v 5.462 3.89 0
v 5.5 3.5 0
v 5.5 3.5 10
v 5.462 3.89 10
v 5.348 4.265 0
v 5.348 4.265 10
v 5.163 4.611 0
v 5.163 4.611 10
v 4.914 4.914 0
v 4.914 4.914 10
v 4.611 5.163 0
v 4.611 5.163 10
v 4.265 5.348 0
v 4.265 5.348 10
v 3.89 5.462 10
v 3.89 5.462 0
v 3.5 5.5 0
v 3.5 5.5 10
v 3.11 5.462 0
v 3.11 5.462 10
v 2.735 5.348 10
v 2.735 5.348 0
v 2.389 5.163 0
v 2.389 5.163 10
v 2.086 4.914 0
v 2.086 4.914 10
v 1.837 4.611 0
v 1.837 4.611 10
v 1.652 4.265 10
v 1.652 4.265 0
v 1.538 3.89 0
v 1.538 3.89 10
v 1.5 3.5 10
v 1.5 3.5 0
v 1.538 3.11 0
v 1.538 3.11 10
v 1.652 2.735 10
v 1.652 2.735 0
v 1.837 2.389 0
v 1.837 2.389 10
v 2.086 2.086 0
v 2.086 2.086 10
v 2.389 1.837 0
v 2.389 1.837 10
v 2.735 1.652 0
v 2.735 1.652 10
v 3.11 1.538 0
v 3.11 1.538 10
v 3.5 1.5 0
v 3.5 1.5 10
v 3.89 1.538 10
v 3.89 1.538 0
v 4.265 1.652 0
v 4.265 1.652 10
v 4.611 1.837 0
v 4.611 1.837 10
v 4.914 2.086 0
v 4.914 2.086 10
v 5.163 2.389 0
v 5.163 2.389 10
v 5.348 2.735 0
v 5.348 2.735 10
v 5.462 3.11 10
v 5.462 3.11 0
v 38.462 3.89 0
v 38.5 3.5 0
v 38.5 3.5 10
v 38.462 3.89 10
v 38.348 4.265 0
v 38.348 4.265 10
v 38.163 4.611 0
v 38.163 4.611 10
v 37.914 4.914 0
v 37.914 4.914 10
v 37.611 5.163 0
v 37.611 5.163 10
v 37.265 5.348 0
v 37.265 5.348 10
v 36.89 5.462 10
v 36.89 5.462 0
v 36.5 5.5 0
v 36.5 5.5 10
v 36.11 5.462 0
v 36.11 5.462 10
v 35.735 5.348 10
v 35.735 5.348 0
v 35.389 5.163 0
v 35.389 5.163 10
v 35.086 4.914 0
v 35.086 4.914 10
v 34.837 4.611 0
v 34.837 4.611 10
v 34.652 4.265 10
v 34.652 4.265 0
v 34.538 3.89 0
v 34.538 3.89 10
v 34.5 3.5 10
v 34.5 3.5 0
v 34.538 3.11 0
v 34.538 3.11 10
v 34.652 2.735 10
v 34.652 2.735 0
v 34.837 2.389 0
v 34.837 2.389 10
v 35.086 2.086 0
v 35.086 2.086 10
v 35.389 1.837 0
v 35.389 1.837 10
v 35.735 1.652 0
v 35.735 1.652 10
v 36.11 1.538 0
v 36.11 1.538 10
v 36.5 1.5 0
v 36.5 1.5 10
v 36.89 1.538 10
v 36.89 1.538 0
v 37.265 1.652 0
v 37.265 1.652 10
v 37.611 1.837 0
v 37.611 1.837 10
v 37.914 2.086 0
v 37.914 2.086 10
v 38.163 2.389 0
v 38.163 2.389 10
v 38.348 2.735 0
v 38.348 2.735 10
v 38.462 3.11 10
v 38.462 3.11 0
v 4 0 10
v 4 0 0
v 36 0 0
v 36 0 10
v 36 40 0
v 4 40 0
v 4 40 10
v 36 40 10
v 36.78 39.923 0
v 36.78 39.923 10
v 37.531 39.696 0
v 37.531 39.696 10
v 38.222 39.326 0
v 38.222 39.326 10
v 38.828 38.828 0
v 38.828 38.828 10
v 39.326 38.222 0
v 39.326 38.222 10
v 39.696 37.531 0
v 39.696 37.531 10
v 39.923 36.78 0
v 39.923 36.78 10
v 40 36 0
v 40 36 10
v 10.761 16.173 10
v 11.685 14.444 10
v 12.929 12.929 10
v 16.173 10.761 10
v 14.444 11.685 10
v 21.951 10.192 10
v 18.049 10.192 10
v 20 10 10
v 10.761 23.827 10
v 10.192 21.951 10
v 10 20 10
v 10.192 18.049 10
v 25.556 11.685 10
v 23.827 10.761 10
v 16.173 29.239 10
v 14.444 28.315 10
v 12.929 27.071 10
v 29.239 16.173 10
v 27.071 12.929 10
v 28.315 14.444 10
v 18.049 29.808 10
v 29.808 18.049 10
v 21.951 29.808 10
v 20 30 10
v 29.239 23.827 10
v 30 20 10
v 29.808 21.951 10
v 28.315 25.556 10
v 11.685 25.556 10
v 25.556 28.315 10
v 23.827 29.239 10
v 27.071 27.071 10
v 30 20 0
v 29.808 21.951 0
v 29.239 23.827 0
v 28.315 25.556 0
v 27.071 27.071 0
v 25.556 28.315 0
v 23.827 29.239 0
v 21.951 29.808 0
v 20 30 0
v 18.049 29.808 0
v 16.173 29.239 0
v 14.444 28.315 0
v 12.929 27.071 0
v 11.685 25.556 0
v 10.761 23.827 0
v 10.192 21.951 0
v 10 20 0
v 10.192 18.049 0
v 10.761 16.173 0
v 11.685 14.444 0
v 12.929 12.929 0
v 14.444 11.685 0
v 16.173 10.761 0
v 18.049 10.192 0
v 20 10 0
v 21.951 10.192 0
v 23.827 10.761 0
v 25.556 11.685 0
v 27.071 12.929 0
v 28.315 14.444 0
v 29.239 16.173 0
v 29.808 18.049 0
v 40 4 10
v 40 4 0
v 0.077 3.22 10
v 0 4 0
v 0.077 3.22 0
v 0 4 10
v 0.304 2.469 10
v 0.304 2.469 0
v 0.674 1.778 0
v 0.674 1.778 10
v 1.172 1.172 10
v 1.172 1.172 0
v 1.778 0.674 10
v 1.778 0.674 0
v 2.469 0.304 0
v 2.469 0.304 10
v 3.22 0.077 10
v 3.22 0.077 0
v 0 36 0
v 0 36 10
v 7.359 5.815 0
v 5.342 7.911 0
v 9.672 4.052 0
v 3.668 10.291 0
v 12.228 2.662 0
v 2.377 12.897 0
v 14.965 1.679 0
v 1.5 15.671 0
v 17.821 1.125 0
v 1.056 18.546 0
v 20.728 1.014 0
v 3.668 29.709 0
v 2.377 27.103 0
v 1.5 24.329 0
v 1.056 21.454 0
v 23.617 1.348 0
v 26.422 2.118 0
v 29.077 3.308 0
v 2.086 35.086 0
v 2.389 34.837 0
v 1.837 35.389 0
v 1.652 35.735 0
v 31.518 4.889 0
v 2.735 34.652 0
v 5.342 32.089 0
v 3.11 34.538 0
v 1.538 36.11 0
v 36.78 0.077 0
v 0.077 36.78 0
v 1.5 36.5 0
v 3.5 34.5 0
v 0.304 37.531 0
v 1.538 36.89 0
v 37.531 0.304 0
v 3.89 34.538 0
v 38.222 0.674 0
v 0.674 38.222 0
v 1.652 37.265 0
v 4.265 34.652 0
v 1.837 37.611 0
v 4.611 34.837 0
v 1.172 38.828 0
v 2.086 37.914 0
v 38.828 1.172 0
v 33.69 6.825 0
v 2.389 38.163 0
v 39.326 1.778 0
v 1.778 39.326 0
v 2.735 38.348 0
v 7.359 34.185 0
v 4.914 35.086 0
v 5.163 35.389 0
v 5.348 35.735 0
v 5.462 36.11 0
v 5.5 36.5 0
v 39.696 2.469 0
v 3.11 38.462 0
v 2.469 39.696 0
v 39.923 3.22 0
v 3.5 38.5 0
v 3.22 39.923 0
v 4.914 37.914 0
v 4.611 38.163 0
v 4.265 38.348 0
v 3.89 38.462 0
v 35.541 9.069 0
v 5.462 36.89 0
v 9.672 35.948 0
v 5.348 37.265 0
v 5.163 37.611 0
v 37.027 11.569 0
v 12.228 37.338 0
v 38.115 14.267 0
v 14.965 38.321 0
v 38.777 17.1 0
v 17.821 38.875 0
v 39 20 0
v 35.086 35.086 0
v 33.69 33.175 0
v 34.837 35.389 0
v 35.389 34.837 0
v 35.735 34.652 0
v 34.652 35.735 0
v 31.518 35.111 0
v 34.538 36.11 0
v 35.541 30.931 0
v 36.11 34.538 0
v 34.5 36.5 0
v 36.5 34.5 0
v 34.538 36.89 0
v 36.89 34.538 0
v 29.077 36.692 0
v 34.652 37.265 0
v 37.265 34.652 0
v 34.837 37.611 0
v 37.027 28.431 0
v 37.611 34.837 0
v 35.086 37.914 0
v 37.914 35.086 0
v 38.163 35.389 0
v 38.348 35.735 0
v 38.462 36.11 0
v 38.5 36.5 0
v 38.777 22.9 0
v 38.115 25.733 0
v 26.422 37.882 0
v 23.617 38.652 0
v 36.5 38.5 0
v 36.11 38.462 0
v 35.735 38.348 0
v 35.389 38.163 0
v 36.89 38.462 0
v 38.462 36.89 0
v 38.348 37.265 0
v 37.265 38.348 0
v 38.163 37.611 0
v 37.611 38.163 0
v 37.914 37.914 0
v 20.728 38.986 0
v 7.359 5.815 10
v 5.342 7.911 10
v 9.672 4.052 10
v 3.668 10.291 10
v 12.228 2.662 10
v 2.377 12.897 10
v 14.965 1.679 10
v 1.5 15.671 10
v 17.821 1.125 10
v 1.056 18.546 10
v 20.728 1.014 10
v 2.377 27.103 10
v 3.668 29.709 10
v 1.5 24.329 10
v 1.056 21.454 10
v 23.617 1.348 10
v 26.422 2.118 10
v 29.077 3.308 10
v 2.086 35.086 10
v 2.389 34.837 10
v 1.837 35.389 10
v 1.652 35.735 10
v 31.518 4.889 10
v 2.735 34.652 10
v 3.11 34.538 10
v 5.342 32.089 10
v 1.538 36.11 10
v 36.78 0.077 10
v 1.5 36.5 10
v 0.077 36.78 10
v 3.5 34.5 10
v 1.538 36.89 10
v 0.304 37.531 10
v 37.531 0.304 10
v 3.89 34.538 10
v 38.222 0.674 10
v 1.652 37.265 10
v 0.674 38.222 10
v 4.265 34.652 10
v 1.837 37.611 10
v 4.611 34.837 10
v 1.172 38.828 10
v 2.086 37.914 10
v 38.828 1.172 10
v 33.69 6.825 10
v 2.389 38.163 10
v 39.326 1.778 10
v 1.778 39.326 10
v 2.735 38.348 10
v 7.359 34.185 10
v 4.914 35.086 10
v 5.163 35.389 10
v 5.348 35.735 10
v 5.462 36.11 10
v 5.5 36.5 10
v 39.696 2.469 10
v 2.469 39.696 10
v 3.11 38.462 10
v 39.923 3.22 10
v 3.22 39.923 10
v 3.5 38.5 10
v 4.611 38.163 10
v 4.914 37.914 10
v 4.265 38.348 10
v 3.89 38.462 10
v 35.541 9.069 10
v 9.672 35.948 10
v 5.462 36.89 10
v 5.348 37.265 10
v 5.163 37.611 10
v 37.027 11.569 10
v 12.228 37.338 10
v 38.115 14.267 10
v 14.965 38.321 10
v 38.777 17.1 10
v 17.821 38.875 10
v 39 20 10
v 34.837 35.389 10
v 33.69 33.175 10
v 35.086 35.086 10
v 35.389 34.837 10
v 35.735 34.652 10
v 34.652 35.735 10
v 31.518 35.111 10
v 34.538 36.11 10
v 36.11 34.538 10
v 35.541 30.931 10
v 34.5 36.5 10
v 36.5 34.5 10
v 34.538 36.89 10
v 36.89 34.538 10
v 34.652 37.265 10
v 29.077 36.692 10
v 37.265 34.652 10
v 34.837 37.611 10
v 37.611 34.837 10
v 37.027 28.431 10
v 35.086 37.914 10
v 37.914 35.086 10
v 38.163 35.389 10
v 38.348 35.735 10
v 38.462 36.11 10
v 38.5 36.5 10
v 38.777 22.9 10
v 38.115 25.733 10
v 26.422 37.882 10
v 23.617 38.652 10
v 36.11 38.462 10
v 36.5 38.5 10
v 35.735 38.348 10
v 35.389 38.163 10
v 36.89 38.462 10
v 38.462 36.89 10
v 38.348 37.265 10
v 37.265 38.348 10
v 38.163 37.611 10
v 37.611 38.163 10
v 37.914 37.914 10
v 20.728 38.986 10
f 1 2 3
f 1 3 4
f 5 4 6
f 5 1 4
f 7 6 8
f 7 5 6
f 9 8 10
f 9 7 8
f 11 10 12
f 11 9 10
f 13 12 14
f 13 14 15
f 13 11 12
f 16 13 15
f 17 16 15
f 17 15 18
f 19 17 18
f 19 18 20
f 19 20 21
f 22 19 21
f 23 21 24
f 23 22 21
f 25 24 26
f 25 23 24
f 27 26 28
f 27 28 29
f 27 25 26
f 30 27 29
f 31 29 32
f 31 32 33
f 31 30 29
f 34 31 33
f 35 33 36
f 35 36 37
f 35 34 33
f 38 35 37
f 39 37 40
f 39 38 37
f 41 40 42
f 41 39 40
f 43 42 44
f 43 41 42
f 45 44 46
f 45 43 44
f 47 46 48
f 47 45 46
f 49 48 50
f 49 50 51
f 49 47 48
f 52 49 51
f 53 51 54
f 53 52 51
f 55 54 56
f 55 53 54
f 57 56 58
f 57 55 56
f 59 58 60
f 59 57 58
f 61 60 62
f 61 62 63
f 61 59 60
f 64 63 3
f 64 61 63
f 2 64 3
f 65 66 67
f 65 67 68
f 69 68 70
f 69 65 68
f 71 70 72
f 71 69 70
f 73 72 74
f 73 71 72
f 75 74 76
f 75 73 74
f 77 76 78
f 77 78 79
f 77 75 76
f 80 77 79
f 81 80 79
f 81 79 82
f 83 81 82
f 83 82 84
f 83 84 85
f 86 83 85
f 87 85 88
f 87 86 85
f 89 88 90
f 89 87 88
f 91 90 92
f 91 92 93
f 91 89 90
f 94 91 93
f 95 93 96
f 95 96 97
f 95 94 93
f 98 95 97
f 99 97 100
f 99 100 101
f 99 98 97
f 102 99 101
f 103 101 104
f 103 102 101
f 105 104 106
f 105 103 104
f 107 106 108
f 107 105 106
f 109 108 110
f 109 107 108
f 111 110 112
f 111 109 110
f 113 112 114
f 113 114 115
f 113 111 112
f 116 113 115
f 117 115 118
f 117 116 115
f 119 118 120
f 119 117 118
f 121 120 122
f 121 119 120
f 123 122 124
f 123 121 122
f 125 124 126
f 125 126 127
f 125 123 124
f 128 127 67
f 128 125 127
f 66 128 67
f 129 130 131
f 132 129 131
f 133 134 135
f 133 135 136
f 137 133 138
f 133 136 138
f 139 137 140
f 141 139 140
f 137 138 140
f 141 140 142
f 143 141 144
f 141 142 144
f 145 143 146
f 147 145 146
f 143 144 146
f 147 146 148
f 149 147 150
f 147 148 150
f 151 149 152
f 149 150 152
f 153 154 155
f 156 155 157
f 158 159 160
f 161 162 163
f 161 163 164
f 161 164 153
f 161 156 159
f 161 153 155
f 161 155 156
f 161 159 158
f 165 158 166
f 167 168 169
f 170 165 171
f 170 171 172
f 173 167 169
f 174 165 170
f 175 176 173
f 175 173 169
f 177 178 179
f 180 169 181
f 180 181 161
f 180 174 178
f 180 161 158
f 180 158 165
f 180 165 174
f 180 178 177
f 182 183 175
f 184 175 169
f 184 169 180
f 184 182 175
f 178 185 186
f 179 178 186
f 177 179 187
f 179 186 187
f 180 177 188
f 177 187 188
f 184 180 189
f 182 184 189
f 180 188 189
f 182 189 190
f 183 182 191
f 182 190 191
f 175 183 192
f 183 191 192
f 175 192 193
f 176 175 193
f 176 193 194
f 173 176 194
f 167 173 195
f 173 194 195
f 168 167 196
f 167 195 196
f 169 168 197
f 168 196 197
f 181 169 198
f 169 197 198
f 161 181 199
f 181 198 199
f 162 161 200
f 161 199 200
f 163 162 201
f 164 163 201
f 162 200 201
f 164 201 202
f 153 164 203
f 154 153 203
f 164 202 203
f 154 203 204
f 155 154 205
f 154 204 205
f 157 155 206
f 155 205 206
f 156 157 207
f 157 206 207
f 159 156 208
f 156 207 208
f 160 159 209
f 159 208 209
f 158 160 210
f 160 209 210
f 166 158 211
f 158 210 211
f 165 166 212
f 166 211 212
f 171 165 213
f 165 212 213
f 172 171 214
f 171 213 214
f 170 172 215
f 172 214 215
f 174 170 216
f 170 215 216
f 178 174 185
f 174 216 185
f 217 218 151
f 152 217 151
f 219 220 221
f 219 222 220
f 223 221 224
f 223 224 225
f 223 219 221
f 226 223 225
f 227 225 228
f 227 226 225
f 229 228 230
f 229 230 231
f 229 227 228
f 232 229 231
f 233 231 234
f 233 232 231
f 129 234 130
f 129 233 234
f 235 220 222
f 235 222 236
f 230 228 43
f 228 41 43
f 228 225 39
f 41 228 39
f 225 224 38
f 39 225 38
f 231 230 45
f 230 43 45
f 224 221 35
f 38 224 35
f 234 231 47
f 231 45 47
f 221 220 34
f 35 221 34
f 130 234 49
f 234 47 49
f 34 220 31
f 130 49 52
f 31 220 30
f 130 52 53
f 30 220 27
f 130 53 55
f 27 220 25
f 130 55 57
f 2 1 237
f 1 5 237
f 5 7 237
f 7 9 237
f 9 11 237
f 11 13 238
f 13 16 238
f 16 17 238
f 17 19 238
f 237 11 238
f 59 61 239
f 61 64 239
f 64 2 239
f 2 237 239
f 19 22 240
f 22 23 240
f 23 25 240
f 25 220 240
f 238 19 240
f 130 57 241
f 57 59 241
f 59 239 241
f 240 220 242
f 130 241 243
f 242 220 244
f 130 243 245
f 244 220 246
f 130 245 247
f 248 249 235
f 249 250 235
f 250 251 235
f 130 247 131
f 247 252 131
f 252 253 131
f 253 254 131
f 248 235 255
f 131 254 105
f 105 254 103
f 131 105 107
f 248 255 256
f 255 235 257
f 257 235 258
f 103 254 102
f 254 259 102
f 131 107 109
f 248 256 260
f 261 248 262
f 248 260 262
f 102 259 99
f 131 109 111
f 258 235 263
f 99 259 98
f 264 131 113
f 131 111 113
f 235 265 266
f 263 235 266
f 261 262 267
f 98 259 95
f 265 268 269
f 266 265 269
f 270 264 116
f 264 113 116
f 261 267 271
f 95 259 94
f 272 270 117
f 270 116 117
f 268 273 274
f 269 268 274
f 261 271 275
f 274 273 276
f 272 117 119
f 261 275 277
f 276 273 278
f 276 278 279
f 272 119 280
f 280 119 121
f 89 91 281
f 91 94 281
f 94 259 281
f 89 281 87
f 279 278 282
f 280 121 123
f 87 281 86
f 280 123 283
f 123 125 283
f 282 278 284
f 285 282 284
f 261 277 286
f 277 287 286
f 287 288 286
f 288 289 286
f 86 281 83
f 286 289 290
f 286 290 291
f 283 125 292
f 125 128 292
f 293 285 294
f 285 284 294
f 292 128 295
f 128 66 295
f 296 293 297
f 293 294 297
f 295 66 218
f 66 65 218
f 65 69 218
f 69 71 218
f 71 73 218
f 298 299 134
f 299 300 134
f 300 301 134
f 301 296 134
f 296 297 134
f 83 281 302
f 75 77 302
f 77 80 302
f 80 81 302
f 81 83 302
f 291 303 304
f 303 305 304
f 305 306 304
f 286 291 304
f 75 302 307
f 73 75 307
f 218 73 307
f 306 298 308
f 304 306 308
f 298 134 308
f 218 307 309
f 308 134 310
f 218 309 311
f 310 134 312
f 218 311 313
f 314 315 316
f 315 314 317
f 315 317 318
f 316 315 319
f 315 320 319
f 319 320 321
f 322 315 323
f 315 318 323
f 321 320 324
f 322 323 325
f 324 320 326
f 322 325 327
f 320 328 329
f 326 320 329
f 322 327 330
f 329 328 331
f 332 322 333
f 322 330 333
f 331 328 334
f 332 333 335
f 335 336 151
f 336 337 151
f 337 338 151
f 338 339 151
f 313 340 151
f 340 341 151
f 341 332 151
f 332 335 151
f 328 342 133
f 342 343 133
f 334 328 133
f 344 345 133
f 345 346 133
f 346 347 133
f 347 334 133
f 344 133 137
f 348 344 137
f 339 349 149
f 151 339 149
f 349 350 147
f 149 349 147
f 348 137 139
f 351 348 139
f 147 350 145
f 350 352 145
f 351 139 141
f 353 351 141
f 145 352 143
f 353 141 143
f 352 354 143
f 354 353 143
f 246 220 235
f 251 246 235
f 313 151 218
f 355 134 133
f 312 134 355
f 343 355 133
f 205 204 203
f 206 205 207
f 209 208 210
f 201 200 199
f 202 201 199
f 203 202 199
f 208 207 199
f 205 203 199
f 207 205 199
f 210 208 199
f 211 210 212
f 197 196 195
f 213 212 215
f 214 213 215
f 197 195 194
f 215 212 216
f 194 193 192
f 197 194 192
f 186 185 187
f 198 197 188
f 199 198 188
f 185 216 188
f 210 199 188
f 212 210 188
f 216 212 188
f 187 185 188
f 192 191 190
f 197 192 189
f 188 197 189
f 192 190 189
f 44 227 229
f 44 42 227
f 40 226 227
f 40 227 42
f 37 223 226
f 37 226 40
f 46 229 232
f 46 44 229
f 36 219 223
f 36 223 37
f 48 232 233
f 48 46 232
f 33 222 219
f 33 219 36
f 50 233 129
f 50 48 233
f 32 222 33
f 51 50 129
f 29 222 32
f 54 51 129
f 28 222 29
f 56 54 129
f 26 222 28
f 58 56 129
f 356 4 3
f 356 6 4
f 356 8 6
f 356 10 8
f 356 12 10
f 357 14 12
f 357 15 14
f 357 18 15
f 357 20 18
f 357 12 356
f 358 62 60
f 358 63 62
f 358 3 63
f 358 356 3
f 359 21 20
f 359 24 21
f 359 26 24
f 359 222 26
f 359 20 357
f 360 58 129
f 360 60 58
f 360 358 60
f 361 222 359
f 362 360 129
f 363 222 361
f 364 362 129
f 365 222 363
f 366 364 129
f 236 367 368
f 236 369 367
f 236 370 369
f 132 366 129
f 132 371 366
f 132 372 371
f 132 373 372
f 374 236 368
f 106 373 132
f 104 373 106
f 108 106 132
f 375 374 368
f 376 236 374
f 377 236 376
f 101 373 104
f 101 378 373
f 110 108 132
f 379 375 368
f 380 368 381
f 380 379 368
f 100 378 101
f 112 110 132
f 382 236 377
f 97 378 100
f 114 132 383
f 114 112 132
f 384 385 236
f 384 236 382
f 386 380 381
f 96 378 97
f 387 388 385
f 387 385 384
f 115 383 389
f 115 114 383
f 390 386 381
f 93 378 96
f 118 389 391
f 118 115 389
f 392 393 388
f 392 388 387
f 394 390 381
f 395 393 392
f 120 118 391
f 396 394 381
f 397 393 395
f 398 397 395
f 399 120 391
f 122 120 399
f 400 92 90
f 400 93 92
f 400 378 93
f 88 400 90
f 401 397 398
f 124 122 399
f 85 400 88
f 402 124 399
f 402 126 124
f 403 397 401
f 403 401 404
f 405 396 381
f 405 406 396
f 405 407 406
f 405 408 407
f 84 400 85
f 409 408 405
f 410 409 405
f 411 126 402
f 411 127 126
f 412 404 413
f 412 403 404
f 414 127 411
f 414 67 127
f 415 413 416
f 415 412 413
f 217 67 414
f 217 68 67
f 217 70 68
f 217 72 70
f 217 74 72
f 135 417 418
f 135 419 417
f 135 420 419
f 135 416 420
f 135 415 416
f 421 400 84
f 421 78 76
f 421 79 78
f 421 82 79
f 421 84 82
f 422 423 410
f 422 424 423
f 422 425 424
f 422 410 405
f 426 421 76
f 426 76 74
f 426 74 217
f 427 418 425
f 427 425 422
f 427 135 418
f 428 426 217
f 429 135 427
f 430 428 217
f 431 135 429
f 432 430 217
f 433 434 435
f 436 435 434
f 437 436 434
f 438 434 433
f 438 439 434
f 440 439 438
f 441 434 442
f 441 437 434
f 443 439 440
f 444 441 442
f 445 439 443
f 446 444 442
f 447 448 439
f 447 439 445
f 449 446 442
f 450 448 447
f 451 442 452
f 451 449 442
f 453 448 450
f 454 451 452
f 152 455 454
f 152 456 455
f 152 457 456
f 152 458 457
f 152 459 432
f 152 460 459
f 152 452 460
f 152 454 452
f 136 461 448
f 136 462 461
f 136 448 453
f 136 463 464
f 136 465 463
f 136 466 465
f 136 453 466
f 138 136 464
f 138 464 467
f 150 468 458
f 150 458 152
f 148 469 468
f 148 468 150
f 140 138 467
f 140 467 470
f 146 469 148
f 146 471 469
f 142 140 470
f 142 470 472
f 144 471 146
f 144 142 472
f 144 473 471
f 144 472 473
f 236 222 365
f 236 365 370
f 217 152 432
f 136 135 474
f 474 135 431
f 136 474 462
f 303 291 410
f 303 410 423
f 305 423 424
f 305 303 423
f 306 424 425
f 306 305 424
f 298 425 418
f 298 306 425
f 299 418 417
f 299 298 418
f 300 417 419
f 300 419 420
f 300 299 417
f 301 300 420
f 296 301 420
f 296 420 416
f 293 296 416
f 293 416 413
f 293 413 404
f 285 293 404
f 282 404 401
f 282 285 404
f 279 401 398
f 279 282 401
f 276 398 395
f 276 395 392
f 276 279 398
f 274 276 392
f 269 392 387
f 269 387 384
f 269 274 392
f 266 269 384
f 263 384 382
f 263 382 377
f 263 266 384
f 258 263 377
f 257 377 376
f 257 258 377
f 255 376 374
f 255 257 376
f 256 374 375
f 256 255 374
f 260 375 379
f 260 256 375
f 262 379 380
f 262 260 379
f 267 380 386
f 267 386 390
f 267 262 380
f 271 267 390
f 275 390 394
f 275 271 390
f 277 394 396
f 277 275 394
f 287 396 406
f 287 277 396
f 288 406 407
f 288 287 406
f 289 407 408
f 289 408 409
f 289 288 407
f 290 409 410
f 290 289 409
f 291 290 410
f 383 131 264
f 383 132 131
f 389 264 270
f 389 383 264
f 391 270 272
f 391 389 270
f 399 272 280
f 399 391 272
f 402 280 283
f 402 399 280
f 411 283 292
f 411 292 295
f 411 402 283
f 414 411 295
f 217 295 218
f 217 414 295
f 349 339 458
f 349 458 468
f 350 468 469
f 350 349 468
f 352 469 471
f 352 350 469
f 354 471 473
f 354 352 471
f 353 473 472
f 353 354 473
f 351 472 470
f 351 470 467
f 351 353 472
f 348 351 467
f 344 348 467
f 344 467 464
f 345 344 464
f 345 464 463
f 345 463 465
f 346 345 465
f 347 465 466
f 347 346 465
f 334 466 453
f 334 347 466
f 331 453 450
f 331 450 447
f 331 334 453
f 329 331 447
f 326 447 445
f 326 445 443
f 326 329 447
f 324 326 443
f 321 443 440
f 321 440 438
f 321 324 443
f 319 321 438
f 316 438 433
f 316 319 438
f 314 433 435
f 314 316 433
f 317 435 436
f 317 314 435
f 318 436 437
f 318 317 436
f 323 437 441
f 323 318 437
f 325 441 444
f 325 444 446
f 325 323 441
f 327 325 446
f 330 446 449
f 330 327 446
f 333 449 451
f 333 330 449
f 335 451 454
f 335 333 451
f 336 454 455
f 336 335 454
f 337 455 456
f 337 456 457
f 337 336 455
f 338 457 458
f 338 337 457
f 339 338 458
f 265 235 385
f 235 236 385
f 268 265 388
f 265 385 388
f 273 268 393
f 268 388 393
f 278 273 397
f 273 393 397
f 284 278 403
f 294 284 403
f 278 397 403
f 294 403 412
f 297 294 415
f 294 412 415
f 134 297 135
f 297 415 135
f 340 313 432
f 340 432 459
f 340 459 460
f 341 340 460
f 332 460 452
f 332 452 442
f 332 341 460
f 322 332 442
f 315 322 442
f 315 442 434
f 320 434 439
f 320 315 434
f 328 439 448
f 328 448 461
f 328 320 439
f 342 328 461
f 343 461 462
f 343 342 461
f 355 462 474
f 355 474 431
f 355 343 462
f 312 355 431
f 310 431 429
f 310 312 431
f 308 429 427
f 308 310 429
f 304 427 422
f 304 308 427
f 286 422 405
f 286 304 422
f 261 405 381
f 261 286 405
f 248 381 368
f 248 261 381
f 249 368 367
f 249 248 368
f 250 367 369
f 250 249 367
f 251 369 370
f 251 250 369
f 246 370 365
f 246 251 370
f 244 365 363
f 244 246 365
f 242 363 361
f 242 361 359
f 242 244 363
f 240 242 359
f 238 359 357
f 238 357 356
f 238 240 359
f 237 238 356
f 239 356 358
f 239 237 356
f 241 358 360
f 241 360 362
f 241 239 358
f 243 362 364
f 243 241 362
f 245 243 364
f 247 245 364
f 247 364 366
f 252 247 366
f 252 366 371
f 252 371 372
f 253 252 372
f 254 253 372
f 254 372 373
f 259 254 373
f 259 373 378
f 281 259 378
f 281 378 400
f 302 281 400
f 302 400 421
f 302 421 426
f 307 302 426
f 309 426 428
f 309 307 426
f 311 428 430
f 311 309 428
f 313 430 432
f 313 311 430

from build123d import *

# Parameters (mm, degrees)
SKETCH1_W             = 40
SKETCH1_H             = 40
SKETCH1_R             = 2
SKETCH1_R_2           = 19
BOSS_EXTRUDE1_DEPTH   = 10
SKETCH1_R_3           = 10
BOSS_EXTRUDE1_2_DEPTH = 10
FILLET1_R             = 4


with BuildPart() as part:
    # Sketch1 → Boss-Extrude1 (new body)
    with BuildSketch(Plane.XY):
        with Locations((20, 20)):
            Rectangle(SKETCH1_W, SKETCH1_H)
        with Locations((3.5, 36.5)):
            Circle(SKETCH1_R, mode=Mode.SUBTRACT)
        with Locations((3.5, 3.5)):
            Circle(SKETCH1_R, mode=Mode.SUBTRACT)
        with Locations((36.5, 3.5)):
            Circle(SKETCH1_R, mode=Mode.SUBTRACT)
        with Locations((36.5, 36.5)):
            Circle(SKETCH1_R, mode=Mode.SUBTRACT)
        with Locations((20, 20)):
            Circle(SKETCH1_R_2, mode=Mode.SUBTRACT)
    extrude(amount=BOSS_EXTRUDE1_DEPTH)

    # Fillet1
    fillet1_edges = [part.edges().sort_by_distance(p)[0] for p in [
        (0, 0, 5),
        (0, 40, 5),
        (40, 40, 5),
        (40, 0, 5),
    ]]
    fillet(fillet1_edges, radius=FILLET1_R)


with BuildPart() as body_2:
    # Sketch1 → Boss-Extrude1 2 (new body)
    with BuildSketch(Plane.XY):
        with Locations((20, 20)):
            Circle(SKETCH1_R_3)
    extrude(amount=BOSS_EXTRUDE1_2_DEPTH)


solid = Compound([part.part, body_2.part])
